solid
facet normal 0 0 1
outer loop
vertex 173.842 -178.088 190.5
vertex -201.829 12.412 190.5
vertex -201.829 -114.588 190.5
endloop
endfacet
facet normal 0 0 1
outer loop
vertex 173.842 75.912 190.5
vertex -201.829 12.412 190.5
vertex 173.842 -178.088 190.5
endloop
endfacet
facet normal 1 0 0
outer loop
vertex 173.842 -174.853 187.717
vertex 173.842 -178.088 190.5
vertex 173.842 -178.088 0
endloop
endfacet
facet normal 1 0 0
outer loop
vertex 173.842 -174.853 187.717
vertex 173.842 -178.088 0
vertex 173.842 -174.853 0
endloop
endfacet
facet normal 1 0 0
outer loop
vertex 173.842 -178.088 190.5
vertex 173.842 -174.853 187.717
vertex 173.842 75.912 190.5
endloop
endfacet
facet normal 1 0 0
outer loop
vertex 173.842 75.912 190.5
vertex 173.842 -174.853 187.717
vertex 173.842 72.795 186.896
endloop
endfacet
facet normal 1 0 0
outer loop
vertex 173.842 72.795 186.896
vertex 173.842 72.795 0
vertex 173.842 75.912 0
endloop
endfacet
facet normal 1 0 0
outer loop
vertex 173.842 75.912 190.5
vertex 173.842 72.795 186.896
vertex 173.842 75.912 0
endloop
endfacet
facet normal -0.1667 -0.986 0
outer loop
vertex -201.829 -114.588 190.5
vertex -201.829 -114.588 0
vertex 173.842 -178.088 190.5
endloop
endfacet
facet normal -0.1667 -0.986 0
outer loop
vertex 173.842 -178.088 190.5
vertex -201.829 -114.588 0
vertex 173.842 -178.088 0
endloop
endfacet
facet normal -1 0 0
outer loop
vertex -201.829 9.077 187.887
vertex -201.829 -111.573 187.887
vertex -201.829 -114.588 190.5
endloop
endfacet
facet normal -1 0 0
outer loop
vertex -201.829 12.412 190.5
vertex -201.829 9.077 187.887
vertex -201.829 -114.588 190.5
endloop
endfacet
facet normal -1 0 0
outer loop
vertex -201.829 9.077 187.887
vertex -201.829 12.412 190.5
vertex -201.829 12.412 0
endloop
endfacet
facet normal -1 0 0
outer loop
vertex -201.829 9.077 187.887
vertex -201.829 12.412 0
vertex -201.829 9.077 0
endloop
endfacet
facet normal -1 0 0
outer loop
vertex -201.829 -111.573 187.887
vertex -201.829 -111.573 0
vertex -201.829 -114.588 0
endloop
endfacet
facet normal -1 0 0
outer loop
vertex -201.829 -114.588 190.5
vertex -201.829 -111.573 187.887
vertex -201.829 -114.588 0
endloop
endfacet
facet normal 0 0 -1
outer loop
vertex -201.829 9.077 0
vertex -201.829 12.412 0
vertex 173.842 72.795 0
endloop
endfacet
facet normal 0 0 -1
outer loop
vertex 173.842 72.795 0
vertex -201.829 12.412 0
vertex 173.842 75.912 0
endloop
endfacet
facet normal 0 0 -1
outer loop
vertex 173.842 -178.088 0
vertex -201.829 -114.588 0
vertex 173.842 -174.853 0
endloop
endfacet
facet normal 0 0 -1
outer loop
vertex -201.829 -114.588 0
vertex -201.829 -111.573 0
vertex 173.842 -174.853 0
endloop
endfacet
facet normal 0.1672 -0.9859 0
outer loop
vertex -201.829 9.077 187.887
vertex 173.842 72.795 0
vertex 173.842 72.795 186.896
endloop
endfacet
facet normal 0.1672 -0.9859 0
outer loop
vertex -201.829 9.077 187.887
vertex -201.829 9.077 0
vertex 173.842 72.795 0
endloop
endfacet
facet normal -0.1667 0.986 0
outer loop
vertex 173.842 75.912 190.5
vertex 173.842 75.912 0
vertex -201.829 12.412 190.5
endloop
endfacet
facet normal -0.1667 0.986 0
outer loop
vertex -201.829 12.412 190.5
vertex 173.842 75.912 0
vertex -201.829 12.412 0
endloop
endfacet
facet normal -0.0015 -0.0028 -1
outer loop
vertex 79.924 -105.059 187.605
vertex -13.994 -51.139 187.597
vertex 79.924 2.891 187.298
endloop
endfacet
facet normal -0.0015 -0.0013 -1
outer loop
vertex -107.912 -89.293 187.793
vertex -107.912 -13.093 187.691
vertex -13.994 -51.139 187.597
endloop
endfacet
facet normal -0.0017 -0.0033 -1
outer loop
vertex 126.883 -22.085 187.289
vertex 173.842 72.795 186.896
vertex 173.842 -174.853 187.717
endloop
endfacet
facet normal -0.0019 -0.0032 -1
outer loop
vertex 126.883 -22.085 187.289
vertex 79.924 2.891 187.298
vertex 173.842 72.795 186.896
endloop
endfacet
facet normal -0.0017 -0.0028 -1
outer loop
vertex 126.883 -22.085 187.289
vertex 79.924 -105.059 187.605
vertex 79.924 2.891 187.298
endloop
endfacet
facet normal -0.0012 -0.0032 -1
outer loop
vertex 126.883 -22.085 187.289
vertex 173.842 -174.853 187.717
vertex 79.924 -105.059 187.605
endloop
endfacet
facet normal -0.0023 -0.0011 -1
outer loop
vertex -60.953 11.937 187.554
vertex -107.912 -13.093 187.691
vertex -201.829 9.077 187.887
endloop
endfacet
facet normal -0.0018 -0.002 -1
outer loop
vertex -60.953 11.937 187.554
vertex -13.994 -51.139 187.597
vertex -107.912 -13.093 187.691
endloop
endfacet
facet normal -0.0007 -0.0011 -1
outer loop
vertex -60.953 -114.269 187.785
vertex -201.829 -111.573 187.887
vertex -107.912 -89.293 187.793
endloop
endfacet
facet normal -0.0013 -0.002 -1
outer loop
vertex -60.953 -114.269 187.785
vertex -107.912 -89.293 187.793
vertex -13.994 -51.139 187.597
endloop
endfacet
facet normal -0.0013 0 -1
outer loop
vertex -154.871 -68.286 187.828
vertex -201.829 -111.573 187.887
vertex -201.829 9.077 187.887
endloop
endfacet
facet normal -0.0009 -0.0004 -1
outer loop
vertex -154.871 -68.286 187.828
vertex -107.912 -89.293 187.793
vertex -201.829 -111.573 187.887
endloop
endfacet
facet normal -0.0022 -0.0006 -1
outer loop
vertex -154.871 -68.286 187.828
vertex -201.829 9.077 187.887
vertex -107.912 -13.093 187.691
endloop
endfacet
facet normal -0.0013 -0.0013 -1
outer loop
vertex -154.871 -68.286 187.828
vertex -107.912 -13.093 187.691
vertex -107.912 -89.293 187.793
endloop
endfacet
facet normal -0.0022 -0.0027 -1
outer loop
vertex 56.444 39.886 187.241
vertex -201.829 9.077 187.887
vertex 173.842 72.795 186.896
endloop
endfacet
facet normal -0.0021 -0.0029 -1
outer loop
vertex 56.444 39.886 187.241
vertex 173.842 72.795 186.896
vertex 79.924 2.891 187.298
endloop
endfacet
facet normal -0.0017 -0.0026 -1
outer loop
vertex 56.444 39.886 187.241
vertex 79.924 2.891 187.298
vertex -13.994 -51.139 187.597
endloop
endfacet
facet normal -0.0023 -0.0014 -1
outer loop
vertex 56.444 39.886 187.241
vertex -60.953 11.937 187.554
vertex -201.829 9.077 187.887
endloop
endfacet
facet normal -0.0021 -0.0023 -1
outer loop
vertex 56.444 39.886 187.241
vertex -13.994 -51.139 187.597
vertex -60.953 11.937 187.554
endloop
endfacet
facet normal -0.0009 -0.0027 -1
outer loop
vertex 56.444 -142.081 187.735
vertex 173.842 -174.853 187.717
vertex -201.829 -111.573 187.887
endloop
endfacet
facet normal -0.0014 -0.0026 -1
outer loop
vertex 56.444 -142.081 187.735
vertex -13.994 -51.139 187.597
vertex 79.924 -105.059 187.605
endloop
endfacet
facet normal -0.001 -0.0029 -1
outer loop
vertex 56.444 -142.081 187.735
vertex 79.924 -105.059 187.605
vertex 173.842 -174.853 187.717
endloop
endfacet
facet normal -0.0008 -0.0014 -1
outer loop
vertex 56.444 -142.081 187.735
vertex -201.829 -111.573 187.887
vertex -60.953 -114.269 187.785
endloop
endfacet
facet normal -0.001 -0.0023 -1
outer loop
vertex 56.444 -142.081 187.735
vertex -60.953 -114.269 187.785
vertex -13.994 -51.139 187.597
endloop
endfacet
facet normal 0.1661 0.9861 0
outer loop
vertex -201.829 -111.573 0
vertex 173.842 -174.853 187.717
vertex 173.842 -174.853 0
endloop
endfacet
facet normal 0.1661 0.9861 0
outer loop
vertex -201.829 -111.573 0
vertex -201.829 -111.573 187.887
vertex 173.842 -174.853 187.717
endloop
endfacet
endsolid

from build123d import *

# Parameters (mm, degrees)
F1_DEPTH = 190.5
F3_W     = 120.65
F3_H     = 187.8874


with BuildPart() as f1:
    # F0 (on Top) → F1 (new body)
    with BuildSketch(Plane.XY):
        Polygon((173.841653, -178.087749), (173.841653, 75.912251), (-201.829414, 12.412251), (-201.829414, -114.587749), align=None)
    extrude(amount=F1_DEPTH)

    # F2 (on face) → F4 section 0
    with BuildSketch(Plane.YZ.offset(173.841653)):
        Polygon((72.795157, 186.896468), (-174.853486, 187.716501), (-174.853486, 0), (72.795157, 0), align=None)
    # F3 (on face) → F4 section 1
    with BuildSketch(Plane(origin=(-201.829414, 0, 0), x_dir=(0, -1, 0), z_dir=(-1, 0, 0))):
        with Locations((51.248075, 93.9437)):
            Rectangle(F3_W, F3_H)
    loft(mode=Mode.SUBTRACT)


solid = f1.part
